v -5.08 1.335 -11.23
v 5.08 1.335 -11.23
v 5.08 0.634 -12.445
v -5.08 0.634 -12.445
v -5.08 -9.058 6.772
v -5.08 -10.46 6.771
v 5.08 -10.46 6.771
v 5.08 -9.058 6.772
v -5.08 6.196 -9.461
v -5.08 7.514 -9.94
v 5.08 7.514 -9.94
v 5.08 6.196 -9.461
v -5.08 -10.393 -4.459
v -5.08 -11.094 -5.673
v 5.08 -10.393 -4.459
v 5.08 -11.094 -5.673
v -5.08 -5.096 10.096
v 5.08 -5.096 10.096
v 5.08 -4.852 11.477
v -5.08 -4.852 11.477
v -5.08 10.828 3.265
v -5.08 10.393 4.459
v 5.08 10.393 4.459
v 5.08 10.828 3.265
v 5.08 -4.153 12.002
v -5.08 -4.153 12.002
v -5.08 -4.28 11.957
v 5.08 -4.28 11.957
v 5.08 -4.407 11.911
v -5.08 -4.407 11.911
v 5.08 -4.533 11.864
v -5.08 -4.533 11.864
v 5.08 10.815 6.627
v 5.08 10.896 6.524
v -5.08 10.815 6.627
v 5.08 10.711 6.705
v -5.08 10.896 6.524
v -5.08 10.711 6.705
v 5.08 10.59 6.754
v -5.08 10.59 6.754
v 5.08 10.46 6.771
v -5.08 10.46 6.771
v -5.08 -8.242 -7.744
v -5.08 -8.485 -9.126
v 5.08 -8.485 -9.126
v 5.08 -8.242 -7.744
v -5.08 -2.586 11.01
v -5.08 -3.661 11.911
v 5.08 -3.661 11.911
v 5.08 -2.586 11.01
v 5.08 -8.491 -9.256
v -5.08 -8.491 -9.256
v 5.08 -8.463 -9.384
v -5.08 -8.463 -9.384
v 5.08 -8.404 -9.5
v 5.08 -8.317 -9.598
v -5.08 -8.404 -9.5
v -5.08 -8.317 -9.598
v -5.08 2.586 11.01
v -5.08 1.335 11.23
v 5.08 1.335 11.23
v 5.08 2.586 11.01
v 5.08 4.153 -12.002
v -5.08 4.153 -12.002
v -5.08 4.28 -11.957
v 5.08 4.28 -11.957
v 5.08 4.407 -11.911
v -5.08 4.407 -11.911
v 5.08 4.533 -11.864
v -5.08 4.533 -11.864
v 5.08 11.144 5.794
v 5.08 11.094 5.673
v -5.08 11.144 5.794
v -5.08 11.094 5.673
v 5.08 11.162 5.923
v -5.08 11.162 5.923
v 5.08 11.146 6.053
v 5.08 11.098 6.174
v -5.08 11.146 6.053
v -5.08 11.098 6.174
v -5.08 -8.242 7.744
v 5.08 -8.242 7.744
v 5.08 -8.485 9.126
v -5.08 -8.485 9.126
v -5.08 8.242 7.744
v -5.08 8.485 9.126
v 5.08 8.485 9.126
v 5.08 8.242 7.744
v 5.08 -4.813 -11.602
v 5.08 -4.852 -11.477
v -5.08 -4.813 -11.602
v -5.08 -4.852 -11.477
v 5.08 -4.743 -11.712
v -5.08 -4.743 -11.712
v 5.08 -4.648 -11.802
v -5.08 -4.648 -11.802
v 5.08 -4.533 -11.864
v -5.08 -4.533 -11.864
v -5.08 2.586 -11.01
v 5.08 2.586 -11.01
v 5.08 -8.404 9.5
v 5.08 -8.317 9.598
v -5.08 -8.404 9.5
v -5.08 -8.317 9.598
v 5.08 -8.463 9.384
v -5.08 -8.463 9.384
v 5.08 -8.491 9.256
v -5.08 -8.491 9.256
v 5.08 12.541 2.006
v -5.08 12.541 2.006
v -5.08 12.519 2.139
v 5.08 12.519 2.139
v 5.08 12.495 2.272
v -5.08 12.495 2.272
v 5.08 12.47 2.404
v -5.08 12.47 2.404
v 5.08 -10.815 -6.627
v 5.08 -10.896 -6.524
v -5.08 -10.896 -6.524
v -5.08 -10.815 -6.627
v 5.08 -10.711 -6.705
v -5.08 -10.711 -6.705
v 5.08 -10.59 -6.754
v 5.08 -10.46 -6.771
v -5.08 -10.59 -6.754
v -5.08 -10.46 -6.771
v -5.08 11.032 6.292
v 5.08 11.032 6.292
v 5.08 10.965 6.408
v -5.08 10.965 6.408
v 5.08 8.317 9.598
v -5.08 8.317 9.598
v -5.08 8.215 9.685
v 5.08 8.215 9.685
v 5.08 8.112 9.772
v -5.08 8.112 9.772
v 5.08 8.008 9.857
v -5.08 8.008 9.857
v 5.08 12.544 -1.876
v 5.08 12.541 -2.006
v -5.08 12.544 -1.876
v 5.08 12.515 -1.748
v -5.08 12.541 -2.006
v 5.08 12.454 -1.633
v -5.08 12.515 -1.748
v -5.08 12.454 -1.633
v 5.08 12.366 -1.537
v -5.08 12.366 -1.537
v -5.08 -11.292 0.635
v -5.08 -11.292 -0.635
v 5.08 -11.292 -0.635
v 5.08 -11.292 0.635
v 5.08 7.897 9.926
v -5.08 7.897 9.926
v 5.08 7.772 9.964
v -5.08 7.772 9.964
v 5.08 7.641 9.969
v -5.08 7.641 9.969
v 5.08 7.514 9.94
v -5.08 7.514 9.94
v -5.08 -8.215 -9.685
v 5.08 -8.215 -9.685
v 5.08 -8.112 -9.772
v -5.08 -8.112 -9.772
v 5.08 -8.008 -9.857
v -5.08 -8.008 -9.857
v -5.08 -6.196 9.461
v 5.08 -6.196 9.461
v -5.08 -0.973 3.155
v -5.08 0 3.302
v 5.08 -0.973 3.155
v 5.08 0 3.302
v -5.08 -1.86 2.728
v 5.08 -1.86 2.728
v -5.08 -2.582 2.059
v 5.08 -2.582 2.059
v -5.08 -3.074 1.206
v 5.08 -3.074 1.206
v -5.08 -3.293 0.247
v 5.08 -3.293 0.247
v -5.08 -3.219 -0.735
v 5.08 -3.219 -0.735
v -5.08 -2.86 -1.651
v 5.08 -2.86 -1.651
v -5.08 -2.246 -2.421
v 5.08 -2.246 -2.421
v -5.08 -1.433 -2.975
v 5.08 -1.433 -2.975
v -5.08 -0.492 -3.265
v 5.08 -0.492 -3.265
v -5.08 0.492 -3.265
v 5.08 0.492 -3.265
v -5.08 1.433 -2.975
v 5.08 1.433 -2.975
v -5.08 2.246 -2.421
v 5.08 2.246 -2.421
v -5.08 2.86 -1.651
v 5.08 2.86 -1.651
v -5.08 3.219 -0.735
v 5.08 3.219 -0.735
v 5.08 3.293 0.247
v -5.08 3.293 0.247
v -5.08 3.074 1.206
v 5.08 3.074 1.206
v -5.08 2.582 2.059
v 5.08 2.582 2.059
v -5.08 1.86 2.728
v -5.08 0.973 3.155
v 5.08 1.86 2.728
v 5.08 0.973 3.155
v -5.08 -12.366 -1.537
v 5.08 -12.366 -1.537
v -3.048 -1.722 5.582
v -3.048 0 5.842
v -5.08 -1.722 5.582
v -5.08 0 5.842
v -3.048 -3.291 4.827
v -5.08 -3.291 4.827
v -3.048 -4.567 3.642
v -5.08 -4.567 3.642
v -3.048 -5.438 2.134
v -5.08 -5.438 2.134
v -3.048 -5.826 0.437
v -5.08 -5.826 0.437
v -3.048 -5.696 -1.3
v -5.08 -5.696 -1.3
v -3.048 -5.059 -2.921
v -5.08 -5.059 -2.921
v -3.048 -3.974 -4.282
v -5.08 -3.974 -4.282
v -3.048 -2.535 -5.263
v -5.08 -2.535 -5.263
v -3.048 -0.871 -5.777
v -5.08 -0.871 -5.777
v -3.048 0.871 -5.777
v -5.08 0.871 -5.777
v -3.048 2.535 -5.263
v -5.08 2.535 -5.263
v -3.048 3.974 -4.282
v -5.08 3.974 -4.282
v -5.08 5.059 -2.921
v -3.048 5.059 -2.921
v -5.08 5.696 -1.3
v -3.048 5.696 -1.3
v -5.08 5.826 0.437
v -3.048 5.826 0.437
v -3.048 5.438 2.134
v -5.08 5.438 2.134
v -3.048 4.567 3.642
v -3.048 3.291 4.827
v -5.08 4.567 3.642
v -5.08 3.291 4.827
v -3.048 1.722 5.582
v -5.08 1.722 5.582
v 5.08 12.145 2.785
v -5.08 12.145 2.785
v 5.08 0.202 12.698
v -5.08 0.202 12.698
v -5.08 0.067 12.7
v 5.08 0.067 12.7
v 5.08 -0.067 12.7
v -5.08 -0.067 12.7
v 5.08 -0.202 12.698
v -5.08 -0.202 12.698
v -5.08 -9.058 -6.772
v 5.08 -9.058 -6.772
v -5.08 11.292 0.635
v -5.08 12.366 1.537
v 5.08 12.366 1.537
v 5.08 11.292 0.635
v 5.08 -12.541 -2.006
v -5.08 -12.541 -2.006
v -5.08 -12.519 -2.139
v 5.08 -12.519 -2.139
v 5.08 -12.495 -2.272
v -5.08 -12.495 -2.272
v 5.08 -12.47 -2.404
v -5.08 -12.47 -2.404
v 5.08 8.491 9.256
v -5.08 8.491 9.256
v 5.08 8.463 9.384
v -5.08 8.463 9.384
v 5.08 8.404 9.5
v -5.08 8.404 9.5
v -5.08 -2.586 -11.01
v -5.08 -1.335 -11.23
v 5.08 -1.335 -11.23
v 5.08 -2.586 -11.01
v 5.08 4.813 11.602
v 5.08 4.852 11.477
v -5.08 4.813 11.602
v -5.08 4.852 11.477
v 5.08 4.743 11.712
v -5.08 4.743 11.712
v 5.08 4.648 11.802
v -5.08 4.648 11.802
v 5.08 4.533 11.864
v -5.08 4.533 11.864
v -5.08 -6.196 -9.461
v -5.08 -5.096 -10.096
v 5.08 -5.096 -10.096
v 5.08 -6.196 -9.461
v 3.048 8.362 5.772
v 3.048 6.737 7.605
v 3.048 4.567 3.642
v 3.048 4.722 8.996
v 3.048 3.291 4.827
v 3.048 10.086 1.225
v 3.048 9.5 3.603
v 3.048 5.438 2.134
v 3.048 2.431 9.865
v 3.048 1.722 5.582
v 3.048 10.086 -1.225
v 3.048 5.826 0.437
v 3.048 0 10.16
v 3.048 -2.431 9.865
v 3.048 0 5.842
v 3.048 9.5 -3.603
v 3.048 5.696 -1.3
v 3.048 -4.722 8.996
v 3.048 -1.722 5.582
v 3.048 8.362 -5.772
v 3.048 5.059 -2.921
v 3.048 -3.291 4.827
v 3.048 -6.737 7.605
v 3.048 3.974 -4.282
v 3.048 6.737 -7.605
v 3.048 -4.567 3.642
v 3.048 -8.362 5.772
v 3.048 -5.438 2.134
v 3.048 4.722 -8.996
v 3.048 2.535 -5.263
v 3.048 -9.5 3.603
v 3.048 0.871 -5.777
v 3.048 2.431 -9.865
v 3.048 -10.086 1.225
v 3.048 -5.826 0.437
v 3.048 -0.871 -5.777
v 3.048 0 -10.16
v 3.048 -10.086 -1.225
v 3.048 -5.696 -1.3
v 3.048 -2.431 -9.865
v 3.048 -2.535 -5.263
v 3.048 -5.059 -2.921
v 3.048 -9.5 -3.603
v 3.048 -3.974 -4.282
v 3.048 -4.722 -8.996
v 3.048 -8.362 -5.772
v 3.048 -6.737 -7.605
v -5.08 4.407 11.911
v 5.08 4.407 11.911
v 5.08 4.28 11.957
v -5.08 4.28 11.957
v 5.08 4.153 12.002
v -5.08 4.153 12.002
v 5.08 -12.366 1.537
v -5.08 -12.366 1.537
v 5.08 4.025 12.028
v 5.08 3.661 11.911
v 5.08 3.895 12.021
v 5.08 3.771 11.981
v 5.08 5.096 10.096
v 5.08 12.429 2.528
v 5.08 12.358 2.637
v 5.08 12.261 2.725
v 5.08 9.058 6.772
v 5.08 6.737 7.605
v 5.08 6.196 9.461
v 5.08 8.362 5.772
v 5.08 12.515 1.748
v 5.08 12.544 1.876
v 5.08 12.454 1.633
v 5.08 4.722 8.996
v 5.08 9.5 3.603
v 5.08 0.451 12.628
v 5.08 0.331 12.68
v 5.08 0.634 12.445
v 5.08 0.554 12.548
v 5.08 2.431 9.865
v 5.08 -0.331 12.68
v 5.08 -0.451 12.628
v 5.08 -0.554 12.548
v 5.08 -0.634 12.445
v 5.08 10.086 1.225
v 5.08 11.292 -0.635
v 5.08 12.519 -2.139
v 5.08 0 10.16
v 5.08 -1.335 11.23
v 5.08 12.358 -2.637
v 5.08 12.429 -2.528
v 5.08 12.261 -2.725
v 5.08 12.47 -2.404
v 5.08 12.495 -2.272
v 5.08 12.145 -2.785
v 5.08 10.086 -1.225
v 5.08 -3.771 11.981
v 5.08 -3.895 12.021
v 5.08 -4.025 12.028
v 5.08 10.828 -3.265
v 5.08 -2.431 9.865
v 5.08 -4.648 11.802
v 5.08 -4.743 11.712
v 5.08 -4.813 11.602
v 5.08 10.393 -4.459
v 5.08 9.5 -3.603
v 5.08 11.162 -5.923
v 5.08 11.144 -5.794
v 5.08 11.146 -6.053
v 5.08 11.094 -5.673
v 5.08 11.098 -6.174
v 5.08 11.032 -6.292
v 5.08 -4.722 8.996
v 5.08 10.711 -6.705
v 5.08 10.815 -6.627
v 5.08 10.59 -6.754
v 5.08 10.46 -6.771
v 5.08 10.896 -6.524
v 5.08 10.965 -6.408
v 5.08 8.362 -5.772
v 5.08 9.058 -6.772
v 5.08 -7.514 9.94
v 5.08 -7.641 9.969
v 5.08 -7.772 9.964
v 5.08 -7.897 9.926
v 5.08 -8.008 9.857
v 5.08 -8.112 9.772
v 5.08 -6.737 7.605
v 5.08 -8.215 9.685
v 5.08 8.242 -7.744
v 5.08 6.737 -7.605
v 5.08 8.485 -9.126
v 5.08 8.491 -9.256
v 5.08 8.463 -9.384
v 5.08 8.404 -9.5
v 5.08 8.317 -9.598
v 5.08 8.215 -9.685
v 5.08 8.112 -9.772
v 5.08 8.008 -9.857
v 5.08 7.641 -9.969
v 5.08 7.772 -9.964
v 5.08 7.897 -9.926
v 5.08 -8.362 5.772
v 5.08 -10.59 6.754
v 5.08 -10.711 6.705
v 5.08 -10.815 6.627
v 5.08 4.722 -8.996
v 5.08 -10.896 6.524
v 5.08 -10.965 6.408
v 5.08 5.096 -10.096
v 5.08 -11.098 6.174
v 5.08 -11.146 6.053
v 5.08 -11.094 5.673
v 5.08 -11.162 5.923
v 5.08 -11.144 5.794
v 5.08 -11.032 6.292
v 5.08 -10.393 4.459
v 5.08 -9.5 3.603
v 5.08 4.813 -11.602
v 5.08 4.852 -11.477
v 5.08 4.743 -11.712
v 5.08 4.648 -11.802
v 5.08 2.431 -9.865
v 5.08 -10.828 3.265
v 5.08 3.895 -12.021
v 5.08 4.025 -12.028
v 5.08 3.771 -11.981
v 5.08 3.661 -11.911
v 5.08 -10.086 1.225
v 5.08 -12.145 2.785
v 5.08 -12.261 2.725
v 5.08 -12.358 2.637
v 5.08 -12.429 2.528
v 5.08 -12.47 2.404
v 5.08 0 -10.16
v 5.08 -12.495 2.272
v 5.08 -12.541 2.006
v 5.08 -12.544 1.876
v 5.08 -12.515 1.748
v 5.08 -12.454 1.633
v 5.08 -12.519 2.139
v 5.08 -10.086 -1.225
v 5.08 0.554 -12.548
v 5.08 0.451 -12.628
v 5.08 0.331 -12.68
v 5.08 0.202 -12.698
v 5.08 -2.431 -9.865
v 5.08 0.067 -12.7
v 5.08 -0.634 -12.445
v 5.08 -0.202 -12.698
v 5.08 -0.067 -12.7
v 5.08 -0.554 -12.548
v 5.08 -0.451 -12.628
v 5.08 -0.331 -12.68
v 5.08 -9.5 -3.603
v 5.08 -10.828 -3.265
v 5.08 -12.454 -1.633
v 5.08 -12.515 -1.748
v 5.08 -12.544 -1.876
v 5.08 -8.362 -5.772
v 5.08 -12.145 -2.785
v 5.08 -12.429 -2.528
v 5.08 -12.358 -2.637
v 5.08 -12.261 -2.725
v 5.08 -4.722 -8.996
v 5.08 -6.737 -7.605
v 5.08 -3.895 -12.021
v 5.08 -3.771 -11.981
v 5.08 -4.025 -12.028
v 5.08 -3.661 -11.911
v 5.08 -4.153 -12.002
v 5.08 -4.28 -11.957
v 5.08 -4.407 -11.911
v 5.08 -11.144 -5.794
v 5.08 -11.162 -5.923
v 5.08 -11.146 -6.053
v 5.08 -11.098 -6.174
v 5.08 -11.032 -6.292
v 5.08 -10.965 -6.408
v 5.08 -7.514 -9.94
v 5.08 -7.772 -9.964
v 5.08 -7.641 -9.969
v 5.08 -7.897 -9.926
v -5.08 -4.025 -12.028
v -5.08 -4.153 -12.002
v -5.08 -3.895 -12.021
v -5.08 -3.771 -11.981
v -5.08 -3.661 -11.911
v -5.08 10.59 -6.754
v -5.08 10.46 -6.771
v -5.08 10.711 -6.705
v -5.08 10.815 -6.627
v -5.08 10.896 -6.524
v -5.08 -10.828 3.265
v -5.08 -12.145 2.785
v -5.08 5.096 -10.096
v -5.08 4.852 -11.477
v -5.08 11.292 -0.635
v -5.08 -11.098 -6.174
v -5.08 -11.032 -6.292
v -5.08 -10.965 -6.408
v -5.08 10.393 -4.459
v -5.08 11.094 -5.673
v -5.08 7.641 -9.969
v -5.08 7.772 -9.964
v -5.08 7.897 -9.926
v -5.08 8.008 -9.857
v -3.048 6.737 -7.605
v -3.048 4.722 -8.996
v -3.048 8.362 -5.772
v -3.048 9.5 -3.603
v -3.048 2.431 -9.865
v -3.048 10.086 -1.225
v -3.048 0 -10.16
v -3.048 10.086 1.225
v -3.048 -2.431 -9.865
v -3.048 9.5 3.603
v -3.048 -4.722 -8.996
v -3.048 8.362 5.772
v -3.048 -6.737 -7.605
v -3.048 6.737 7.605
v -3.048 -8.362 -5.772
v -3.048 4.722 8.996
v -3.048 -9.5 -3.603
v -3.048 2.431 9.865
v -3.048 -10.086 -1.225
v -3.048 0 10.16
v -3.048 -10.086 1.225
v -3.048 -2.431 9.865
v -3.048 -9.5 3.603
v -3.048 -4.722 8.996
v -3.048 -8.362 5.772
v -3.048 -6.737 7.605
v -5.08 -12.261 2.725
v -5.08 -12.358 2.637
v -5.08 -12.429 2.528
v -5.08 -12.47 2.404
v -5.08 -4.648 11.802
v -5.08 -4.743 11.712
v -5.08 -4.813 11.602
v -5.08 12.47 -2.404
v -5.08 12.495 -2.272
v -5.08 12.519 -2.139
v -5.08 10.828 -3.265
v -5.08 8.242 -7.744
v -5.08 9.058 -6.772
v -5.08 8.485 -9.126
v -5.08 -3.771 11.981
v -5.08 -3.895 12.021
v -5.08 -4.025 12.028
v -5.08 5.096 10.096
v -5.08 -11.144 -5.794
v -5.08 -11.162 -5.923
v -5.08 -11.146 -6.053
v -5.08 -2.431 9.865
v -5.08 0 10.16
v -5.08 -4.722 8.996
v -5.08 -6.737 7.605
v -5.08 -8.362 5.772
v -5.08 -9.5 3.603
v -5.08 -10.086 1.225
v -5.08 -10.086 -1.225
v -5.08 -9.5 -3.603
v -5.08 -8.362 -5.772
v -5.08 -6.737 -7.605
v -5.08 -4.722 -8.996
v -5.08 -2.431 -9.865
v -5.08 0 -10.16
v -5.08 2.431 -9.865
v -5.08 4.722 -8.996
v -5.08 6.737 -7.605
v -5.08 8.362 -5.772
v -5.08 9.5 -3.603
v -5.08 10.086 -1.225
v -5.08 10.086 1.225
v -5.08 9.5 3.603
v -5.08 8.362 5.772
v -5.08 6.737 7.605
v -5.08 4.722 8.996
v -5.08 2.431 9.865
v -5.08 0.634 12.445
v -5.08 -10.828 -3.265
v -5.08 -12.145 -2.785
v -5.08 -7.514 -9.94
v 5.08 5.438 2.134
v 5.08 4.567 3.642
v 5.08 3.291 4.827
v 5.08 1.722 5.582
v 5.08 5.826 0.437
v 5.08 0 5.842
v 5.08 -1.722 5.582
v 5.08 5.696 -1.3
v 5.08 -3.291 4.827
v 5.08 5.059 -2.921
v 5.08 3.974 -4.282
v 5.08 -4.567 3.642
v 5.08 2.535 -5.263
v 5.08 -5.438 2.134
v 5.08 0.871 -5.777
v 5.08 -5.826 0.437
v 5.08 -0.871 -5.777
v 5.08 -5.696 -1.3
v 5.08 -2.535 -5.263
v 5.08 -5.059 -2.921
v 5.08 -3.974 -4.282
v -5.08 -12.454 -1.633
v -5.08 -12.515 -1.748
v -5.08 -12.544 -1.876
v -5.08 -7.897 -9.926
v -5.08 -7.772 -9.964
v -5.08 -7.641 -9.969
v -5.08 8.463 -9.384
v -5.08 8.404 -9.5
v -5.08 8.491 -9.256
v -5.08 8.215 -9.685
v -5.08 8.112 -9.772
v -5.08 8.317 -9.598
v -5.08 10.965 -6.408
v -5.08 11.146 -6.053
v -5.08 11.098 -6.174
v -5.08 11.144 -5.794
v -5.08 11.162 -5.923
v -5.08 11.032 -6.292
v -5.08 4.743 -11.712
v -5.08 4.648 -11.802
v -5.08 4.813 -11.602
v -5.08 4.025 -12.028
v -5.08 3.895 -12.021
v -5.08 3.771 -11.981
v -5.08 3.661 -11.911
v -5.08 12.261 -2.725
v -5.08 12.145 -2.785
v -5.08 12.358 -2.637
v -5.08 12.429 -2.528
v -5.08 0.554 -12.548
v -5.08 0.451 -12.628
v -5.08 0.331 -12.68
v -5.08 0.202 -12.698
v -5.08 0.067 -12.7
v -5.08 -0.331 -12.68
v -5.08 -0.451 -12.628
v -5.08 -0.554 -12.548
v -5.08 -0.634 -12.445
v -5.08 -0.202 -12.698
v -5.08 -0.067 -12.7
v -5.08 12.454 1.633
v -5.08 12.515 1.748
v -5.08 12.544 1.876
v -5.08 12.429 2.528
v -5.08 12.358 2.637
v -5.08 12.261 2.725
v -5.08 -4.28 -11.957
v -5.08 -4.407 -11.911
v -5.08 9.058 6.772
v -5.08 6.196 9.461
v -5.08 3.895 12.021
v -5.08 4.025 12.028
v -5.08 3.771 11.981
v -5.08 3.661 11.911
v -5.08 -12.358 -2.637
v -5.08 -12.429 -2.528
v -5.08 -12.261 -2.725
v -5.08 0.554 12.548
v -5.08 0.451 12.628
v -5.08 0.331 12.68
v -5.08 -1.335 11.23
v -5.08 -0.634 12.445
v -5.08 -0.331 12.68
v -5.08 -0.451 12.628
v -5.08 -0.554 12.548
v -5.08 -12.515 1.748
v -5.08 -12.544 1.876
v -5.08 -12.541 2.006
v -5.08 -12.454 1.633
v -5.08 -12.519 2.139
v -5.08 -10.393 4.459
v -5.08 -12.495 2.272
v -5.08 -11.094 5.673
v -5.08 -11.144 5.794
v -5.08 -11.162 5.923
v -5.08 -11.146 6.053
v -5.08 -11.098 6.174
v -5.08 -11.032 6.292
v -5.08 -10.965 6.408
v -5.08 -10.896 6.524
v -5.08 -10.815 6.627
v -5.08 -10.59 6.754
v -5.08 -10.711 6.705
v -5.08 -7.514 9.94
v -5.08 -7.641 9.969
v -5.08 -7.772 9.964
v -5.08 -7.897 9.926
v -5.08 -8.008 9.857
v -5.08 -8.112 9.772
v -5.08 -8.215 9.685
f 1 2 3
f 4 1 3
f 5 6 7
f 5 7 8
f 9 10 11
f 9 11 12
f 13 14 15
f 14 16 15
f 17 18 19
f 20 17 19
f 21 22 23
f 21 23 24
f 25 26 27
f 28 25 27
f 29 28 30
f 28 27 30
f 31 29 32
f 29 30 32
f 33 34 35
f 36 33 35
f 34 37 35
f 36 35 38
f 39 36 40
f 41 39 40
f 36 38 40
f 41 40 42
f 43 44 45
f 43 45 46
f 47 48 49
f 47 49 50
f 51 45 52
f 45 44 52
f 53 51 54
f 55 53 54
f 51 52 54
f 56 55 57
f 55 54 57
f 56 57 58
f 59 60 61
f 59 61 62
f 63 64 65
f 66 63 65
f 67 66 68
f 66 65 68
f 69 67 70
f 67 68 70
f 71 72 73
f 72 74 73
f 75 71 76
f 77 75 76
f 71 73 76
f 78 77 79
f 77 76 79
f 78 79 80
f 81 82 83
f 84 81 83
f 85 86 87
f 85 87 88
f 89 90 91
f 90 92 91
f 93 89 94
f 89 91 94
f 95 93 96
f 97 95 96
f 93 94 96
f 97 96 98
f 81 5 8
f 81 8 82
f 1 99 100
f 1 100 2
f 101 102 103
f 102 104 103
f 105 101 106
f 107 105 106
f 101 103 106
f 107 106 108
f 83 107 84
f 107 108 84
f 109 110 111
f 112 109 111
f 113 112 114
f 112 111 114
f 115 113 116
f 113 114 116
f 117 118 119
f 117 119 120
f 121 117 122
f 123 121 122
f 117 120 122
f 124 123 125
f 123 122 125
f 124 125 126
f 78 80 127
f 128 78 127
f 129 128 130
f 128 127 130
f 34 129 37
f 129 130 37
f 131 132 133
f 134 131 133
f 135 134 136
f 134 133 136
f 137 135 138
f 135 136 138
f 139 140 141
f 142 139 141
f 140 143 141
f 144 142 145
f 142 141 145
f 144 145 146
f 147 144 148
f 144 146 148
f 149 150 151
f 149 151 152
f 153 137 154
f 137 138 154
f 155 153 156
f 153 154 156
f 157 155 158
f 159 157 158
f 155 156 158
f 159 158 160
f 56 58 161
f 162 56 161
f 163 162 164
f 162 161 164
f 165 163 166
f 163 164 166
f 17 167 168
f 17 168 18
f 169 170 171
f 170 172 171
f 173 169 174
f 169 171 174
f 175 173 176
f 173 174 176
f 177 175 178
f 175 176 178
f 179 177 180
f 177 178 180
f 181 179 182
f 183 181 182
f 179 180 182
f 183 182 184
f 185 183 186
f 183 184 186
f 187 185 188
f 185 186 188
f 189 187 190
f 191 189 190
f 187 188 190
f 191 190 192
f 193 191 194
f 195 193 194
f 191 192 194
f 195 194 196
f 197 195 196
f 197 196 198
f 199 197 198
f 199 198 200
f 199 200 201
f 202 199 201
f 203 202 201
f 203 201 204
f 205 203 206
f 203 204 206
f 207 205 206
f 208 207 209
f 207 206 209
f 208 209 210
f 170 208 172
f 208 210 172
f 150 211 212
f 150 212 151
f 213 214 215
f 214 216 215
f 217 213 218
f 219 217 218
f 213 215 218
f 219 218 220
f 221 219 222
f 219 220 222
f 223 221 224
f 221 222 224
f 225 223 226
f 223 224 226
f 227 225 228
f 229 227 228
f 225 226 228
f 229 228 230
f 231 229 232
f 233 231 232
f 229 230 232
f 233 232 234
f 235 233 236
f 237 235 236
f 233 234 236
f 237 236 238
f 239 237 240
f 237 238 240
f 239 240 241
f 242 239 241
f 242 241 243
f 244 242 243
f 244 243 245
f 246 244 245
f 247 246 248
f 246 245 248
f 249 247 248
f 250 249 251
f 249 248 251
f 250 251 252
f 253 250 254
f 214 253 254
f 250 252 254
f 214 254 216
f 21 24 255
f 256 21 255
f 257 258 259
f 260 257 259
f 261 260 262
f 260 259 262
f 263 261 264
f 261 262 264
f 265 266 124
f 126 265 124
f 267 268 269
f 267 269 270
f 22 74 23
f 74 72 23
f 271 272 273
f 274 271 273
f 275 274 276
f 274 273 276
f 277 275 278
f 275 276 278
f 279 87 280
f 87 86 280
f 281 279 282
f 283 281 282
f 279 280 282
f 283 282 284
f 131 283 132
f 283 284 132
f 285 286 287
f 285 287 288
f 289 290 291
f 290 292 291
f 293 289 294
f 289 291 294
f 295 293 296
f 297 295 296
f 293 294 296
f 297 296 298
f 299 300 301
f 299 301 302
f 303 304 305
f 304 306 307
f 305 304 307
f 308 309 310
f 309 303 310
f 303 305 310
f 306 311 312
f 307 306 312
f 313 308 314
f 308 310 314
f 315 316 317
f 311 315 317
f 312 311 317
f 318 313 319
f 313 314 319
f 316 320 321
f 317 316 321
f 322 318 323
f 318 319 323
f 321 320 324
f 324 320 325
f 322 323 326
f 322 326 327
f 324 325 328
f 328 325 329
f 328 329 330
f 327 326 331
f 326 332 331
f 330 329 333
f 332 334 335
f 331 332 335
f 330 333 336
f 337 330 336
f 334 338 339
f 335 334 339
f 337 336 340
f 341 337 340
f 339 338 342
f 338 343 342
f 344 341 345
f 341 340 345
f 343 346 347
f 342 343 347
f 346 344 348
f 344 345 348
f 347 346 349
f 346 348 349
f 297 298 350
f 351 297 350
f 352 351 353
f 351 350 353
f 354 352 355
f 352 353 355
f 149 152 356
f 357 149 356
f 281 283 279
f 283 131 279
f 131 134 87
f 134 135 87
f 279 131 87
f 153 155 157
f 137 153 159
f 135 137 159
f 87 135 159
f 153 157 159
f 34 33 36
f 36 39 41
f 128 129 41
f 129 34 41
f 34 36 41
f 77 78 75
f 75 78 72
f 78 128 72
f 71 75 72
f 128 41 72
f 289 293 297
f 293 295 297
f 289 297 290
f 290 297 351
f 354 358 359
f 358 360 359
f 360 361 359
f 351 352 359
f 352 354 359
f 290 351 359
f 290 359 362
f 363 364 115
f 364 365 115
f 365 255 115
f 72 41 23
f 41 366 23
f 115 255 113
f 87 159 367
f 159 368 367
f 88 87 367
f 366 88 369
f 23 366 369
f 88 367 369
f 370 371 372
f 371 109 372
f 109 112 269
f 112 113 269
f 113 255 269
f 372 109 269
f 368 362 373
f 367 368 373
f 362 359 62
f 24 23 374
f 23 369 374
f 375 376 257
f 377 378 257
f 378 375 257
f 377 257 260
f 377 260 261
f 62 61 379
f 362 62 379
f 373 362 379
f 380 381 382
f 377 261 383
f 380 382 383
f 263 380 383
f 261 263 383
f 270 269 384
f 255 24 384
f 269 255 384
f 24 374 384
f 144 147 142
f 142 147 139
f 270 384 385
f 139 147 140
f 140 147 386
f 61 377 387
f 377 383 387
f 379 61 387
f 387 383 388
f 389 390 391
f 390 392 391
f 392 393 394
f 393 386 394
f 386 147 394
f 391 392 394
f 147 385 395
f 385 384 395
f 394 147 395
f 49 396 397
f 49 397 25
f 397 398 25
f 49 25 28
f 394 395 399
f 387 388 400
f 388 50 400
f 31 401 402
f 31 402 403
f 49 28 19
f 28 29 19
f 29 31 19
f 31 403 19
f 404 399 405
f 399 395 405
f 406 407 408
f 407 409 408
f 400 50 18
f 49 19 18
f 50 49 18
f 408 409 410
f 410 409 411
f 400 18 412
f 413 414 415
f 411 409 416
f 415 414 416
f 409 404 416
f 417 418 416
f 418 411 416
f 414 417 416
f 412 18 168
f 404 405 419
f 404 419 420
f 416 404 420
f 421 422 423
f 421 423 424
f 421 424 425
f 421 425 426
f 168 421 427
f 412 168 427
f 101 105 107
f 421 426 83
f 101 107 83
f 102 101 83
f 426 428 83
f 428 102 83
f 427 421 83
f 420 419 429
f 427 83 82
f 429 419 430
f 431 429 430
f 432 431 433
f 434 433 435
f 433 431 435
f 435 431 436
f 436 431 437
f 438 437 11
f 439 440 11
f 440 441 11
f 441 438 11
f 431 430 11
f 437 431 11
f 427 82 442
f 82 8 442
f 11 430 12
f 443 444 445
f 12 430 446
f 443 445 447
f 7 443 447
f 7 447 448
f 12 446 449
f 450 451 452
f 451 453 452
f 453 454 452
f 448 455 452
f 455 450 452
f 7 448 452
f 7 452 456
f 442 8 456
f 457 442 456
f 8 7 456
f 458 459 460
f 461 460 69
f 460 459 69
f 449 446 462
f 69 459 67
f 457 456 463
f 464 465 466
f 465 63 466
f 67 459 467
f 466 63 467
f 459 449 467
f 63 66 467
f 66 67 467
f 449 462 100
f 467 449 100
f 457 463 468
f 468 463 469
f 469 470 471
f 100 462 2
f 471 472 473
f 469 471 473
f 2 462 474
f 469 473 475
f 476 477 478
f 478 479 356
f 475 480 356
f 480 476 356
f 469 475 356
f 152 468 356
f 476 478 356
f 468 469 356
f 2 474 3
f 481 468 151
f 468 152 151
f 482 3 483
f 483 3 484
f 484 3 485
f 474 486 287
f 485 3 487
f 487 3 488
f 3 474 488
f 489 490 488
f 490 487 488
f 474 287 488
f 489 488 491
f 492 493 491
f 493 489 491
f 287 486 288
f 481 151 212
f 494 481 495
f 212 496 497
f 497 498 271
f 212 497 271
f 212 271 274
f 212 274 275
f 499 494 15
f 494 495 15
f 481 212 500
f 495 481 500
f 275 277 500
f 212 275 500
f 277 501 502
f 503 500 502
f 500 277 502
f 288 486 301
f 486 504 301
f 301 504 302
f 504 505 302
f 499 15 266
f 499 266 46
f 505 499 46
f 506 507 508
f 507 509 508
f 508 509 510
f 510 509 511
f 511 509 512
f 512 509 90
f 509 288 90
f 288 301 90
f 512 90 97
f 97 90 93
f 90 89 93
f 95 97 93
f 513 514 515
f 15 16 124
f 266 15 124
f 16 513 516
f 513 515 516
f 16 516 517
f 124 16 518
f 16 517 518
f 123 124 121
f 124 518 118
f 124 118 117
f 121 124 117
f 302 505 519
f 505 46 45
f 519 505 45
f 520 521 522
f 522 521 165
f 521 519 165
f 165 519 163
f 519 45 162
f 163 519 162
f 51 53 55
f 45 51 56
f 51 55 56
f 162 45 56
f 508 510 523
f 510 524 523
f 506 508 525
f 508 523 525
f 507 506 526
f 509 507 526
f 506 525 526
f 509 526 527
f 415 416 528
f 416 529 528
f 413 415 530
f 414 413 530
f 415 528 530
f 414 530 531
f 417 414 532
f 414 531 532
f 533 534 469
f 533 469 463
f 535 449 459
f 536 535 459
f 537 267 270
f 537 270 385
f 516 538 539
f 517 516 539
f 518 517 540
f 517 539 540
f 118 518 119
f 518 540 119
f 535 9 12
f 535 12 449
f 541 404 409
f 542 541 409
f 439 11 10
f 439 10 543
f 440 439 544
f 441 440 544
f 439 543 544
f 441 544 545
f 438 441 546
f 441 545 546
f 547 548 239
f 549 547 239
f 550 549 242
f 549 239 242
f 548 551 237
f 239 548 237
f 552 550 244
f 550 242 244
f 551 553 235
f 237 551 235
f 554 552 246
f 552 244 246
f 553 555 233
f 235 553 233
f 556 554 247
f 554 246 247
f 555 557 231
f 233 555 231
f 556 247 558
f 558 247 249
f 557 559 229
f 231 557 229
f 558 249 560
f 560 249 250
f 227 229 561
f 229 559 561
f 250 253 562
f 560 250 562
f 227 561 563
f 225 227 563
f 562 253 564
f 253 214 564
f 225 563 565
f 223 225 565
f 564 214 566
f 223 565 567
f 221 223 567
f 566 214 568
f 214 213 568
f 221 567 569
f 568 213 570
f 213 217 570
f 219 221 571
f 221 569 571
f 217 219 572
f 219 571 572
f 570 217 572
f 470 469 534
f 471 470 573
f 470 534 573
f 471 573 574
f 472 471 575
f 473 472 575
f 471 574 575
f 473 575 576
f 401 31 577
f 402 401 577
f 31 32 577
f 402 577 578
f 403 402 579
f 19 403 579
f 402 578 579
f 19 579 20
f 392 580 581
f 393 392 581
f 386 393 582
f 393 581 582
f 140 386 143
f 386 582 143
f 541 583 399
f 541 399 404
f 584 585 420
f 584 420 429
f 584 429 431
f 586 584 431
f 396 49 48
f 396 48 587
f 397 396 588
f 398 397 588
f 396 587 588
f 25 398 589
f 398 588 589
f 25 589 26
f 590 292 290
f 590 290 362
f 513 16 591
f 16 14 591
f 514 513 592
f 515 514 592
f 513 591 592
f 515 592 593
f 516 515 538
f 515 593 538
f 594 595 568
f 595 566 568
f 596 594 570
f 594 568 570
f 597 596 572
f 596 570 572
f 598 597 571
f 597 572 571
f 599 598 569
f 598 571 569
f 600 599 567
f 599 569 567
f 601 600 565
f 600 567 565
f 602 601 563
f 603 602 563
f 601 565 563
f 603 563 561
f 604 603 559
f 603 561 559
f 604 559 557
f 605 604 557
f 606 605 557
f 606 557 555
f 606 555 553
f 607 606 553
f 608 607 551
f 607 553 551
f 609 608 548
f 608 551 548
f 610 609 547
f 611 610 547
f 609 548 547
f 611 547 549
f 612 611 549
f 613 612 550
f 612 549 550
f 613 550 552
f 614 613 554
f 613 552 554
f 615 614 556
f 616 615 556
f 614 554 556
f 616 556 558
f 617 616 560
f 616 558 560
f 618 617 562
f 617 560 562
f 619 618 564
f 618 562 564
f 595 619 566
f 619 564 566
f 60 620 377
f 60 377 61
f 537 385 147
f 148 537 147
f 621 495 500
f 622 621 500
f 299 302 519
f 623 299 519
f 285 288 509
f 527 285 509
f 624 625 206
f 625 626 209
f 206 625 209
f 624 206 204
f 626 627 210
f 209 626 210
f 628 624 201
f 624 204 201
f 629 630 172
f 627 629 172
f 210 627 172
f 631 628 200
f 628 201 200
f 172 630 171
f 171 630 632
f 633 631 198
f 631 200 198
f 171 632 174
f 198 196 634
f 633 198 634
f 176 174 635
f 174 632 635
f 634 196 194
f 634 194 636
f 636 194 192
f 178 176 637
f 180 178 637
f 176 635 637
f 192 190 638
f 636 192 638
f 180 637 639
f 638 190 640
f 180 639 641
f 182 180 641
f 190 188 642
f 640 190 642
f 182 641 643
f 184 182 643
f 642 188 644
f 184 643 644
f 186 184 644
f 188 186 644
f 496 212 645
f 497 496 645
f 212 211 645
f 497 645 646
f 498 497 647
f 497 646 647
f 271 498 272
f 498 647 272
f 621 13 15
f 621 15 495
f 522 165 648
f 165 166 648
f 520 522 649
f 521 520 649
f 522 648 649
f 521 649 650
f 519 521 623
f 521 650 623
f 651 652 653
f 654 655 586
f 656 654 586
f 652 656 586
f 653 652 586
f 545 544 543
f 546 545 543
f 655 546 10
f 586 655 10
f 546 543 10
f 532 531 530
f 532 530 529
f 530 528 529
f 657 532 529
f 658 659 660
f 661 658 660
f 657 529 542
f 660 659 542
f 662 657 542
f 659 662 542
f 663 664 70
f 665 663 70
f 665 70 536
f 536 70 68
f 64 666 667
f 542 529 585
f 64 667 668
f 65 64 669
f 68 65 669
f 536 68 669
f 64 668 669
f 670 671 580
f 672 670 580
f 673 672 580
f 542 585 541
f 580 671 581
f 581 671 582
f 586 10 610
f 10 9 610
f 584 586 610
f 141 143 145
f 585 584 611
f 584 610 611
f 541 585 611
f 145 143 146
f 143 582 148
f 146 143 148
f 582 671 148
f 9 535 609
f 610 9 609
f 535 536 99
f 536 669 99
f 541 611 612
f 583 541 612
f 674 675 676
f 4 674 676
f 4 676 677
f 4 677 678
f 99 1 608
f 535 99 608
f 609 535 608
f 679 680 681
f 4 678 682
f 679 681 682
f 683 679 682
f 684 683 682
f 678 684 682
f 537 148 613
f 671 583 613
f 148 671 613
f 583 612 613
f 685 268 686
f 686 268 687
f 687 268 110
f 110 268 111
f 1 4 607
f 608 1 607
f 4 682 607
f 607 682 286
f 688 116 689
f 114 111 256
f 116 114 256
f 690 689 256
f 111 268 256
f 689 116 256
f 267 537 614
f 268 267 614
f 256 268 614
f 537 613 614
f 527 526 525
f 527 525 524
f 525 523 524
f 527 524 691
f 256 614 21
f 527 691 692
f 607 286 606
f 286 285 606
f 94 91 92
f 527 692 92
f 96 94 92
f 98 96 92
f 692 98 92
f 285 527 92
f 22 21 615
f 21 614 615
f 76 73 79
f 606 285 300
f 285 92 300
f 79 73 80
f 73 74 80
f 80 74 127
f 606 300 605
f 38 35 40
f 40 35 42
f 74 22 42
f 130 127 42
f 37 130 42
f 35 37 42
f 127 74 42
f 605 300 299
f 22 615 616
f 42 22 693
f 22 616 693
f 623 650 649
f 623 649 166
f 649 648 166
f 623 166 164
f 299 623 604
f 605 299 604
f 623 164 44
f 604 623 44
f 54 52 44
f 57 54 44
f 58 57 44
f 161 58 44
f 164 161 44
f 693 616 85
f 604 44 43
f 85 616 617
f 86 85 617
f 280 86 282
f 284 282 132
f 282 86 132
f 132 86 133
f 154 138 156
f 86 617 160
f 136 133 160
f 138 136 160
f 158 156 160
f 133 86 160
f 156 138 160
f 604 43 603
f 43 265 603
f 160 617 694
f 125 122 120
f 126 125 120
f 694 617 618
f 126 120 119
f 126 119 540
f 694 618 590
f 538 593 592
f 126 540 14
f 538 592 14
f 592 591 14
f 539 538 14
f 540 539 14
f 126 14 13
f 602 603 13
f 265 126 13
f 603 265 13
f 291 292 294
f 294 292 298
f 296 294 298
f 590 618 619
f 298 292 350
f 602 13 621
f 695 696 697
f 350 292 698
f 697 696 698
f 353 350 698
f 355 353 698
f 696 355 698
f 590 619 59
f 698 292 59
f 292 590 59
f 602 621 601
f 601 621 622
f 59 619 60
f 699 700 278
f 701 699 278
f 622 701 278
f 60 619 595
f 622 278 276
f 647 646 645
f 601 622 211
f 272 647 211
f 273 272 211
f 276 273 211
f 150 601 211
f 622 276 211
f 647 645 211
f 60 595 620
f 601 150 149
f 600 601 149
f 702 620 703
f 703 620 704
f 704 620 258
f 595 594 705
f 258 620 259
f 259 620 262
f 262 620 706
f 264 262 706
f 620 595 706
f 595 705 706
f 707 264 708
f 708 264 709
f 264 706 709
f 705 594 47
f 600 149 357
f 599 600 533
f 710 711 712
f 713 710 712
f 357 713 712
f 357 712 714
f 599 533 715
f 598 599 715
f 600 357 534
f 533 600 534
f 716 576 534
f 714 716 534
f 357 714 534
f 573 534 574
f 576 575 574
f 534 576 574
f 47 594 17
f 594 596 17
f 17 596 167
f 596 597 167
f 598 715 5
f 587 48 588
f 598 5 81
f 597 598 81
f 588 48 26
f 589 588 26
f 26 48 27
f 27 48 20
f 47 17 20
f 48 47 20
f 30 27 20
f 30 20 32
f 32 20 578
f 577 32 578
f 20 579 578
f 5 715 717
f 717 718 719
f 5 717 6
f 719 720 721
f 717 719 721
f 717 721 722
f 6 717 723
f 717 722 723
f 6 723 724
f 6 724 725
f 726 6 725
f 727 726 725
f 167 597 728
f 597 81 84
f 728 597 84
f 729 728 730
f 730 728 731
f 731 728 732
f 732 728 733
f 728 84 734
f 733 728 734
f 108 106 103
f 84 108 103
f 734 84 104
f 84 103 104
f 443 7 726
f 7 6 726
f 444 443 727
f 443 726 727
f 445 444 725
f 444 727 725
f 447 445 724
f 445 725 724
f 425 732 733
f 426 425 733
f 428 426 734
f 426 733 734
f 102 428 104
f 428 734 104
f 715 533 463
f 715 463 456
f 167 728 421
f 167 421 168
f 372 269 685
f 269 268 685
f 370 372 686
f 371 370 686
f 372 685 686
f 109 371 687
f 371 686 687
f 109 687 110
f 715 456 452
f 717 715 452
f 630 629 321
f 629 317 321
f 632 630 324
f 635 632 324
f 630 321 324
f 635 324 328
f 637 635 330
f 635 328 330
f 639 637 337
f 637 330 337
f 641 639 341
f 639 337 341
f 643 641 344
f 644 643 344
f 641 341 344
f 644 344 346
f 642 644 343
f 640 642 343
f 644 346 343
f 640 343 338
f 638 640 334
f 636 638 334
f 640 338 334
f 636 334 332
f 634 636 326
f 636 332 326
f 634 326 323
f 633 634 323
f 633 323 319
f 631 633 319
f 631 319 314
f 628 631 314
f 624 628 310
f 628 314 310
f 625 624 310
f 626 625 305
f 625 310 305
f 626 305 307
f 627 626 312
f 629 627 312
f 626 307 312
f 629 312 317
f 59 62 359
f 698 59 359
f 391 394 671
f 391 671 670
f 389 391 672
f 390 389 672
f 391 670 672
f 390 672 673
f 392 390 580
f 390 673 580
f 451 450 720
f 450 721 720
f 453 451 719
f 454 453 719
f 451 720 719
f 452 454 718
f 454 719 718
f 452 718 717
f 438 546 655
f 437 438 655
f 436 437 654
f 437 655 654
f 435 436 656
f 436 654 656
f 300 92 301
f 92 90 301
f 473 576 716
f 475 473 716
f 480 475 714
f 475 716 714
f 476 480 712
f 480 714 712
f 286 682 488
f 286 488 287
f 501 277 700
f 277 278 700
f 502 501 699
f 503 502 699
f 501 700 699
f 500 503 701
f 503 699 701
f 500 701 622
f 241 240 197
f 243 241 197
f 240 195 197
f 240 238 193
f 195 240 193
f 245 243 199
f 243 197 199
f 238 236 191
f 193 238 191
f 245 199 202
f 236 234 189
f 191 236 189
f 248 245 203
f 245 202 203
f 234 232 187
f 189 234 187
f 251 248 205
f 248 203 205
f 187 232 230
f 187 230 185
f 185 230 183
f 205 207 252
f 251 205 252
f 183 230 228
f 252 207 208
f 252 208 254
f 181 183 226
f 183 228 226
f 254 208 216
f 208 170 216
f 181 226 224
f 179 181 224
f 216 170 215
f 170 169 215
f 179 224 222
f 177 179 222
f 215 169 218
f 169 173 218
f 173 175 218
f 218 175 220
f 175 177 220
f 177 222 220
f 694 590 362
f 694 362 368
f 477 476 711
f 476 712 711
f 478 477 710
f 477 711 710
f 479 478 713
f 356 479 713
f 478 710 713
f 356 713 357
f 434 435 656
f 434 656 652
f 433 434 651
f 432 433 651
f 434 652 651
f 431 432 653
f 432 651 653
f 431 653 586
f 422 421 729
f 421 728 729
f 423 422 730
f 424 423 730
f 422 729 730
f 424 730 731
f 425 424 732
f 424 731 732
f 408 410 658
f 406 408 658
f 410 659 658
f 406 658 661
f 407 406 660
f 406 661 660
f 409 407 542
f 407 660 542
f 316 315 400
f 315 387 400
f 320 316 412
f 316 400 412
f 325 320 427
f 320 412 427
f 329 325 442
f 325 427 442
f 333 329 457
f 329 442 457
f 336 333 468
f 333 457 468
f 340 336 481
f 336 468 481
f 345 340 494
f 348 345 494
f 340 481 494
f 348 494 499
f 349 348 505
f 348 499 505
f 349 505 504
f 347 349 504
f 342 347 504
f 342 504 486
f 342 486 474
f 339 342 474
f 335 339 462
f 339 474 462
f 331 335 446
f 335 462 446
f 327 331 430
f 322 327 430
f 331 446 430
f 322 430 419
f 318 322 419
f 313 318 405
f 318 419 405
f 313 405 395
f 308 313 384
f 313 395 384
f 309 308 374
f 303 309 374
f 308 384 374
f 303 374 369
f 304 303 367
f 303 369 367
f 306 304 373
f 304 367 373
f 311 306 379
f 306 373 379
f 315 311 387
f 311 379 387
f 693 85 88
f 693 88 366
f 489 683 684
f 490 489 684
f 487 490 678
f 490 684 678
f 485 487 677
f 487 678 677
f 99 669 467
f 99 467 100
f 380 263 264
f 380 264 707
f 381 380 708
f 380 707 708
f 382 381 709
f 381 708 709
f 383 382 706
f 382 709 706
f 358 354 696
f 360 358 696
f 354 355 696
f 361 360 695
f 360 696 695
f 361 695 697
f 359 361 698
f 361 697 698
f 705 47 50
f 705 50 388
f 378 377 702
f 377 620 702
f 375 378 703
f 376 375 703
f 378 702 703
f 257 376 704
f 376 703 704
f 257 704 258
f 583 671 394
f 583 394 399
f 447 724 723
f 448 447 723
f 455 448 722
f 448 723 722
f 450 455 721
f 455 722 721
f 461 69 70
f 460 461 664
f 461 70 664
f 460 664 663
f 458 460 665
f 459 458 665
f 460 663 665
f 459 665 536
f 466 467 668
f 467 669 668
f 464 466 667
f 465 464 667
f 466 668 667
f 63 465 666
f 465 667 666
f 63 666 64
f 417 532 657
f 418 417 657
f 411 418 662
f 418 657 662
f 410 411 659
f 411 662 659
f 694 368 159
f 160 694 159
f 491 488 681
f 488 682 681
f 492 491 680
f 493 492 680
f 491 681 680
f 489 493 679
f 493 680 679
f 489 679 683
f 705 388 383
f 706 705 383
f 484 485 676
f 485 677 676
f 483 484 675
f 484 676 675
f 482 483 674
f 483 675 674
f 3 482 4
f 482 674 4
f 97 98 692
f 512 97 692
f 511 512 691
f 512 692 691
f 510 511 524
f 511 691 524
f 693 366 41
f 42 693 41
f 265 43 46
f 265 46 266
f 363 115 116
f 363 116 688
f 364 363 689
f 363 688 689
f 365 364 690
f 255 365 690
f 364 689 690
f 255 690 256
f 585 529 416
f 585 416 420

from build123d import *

# Parameters (mm, degrees)
CUT_EXTRUDE1_DEPTH       = 19.66511184
FILLET2_R                = 0.508
CIRPATTERN1_COUNT        = 18
FILLET2_OF_CIRPATTERN1_R = 0.508


with BuildPart() as part:
    # Sketch1 → Revolve1 (revolve)
    with BuildSketch(Plane.XY, mode=Mode.PRIVATE) as revolve1_sk:
        Polygon((5.08, 5.842), (3.048, 5.842), (3.048, 10.16), (5.08, 10.16), (5.08, 12.7), (-5.08, 12.7), (-5.08, 10.16), (-3.048, 10.16), (-3.048, 5.842), (-5.08, 5.842), (-5.08, 3.302), (5.08, 3.302), align=None)
    revolve(revolve1_sk.sketch.rotate(Axis((0, 0, 0), (1, 0, 0)), 90), axis=Axis((0, 0, 0), (1, 0, 0)))

    # Sketch2 → Cut-Extrude1 (cut, symmetric)
    with BuildSketch(Plane(origin=(0, 0, 0), x_dir=(0, 0, -1), z_dir=(1, 0, 0))):
        Polygon((0.635, 11.291535111), (1.991281675, 12.906814359), (-1.991281675, 12.906814359), (-0.635, 11.291535111), align=None)
    cut_extrude1 = extrude(amount=CUT_EXTRUDE1_DEPTH, both=True, mode=Mode.SUBTRACT)

    # Fillet2
    fillet2_edges = [part.edges().sort_by_distance(p)[0] for p in [
        (0, 12.583064675, 1.719442756),
        (0, 12.583064675, -1.719442756),
    ]]
    fillet(fillet2_edges, radius=FILLET2_R)

    # CirPattern1: Cut-Extrude1 ×18 about axis
    cirpattern1_axis = Axis((0, 0, 0), (1, 0, 0))
    for i in range(1, CIRPATTERN1_COUNT):
        add(cut_extrude1.rotate(cirpattern1_axis, i * 360 / CIRPATTERN1_COUNT), mode=Mode.SUBTRACT)

    # Fillet2 of CirPattern1
    fillet2_of_cirpattern1_edges = [part.edges().sort_by_distance(p)[0] for p in [
        (0, 11.236128964, 5.919409254),
        (0, 12.41229708, 2.687913913),
        (0, 8.533950272, 9.405407634),
        (0, 10.744423271, 6.771068496),
        (0, 4.80245123, 11.756975044),
        (0, 7.780613445, 10.037532288),
        (0, 0.491705693, 12.69047775),
        (0, 3.878346808, 12.093321547),
        (0, -3.878346808, 12.093321547),
        (0, -0.491705693, 12.69047775),
        (0, -7.780613445, 10.037532288),
        (0, -4.80245123, 11.756975044),
        (0, -10.744423271, 6.771068496),
        (0, -8.533950272, 9.405407634),
        (0, -12.41229708, 2.687913913),
        (0, -11.236128964, 5.919409254),
        (0, -12.583064675, -1.719442756),
        (0, -12.583064675, 1.719442756),
        (0, -11.236128964, -5.919409254),
        (0, -12.41229708, -2.687913913),
        (0, -8.533950272, -9.405407634),
        (0, -10.744423271, -6.771068496),
        (0, -4.80245123, -11.756975044),
        (0, -7.780613445, -10.037532288),
        (0, -0.491705693, -12.69047775),
        (0, -3.878346808, -12.093321547),
        (0, 3.878346808, -12.093321547),
        (0, 0.491705693, -12.69047775),
        (0, 7.780613445, -10.037532288),
        (0, 4.80245123, -11.756975044),
        (0, 10.744423271, -6.771068496),
        (0, 8.533950272, -9.405407634),
        (0, 12.41229708, -2.687913913),
        (0, 11.236128964, -5.919409254),
    ]]
    fillet(fillet2_of_cirpattern1_edges, radius=FILLET2_OF_CIRPATTERN1_R)


solid = part.part
